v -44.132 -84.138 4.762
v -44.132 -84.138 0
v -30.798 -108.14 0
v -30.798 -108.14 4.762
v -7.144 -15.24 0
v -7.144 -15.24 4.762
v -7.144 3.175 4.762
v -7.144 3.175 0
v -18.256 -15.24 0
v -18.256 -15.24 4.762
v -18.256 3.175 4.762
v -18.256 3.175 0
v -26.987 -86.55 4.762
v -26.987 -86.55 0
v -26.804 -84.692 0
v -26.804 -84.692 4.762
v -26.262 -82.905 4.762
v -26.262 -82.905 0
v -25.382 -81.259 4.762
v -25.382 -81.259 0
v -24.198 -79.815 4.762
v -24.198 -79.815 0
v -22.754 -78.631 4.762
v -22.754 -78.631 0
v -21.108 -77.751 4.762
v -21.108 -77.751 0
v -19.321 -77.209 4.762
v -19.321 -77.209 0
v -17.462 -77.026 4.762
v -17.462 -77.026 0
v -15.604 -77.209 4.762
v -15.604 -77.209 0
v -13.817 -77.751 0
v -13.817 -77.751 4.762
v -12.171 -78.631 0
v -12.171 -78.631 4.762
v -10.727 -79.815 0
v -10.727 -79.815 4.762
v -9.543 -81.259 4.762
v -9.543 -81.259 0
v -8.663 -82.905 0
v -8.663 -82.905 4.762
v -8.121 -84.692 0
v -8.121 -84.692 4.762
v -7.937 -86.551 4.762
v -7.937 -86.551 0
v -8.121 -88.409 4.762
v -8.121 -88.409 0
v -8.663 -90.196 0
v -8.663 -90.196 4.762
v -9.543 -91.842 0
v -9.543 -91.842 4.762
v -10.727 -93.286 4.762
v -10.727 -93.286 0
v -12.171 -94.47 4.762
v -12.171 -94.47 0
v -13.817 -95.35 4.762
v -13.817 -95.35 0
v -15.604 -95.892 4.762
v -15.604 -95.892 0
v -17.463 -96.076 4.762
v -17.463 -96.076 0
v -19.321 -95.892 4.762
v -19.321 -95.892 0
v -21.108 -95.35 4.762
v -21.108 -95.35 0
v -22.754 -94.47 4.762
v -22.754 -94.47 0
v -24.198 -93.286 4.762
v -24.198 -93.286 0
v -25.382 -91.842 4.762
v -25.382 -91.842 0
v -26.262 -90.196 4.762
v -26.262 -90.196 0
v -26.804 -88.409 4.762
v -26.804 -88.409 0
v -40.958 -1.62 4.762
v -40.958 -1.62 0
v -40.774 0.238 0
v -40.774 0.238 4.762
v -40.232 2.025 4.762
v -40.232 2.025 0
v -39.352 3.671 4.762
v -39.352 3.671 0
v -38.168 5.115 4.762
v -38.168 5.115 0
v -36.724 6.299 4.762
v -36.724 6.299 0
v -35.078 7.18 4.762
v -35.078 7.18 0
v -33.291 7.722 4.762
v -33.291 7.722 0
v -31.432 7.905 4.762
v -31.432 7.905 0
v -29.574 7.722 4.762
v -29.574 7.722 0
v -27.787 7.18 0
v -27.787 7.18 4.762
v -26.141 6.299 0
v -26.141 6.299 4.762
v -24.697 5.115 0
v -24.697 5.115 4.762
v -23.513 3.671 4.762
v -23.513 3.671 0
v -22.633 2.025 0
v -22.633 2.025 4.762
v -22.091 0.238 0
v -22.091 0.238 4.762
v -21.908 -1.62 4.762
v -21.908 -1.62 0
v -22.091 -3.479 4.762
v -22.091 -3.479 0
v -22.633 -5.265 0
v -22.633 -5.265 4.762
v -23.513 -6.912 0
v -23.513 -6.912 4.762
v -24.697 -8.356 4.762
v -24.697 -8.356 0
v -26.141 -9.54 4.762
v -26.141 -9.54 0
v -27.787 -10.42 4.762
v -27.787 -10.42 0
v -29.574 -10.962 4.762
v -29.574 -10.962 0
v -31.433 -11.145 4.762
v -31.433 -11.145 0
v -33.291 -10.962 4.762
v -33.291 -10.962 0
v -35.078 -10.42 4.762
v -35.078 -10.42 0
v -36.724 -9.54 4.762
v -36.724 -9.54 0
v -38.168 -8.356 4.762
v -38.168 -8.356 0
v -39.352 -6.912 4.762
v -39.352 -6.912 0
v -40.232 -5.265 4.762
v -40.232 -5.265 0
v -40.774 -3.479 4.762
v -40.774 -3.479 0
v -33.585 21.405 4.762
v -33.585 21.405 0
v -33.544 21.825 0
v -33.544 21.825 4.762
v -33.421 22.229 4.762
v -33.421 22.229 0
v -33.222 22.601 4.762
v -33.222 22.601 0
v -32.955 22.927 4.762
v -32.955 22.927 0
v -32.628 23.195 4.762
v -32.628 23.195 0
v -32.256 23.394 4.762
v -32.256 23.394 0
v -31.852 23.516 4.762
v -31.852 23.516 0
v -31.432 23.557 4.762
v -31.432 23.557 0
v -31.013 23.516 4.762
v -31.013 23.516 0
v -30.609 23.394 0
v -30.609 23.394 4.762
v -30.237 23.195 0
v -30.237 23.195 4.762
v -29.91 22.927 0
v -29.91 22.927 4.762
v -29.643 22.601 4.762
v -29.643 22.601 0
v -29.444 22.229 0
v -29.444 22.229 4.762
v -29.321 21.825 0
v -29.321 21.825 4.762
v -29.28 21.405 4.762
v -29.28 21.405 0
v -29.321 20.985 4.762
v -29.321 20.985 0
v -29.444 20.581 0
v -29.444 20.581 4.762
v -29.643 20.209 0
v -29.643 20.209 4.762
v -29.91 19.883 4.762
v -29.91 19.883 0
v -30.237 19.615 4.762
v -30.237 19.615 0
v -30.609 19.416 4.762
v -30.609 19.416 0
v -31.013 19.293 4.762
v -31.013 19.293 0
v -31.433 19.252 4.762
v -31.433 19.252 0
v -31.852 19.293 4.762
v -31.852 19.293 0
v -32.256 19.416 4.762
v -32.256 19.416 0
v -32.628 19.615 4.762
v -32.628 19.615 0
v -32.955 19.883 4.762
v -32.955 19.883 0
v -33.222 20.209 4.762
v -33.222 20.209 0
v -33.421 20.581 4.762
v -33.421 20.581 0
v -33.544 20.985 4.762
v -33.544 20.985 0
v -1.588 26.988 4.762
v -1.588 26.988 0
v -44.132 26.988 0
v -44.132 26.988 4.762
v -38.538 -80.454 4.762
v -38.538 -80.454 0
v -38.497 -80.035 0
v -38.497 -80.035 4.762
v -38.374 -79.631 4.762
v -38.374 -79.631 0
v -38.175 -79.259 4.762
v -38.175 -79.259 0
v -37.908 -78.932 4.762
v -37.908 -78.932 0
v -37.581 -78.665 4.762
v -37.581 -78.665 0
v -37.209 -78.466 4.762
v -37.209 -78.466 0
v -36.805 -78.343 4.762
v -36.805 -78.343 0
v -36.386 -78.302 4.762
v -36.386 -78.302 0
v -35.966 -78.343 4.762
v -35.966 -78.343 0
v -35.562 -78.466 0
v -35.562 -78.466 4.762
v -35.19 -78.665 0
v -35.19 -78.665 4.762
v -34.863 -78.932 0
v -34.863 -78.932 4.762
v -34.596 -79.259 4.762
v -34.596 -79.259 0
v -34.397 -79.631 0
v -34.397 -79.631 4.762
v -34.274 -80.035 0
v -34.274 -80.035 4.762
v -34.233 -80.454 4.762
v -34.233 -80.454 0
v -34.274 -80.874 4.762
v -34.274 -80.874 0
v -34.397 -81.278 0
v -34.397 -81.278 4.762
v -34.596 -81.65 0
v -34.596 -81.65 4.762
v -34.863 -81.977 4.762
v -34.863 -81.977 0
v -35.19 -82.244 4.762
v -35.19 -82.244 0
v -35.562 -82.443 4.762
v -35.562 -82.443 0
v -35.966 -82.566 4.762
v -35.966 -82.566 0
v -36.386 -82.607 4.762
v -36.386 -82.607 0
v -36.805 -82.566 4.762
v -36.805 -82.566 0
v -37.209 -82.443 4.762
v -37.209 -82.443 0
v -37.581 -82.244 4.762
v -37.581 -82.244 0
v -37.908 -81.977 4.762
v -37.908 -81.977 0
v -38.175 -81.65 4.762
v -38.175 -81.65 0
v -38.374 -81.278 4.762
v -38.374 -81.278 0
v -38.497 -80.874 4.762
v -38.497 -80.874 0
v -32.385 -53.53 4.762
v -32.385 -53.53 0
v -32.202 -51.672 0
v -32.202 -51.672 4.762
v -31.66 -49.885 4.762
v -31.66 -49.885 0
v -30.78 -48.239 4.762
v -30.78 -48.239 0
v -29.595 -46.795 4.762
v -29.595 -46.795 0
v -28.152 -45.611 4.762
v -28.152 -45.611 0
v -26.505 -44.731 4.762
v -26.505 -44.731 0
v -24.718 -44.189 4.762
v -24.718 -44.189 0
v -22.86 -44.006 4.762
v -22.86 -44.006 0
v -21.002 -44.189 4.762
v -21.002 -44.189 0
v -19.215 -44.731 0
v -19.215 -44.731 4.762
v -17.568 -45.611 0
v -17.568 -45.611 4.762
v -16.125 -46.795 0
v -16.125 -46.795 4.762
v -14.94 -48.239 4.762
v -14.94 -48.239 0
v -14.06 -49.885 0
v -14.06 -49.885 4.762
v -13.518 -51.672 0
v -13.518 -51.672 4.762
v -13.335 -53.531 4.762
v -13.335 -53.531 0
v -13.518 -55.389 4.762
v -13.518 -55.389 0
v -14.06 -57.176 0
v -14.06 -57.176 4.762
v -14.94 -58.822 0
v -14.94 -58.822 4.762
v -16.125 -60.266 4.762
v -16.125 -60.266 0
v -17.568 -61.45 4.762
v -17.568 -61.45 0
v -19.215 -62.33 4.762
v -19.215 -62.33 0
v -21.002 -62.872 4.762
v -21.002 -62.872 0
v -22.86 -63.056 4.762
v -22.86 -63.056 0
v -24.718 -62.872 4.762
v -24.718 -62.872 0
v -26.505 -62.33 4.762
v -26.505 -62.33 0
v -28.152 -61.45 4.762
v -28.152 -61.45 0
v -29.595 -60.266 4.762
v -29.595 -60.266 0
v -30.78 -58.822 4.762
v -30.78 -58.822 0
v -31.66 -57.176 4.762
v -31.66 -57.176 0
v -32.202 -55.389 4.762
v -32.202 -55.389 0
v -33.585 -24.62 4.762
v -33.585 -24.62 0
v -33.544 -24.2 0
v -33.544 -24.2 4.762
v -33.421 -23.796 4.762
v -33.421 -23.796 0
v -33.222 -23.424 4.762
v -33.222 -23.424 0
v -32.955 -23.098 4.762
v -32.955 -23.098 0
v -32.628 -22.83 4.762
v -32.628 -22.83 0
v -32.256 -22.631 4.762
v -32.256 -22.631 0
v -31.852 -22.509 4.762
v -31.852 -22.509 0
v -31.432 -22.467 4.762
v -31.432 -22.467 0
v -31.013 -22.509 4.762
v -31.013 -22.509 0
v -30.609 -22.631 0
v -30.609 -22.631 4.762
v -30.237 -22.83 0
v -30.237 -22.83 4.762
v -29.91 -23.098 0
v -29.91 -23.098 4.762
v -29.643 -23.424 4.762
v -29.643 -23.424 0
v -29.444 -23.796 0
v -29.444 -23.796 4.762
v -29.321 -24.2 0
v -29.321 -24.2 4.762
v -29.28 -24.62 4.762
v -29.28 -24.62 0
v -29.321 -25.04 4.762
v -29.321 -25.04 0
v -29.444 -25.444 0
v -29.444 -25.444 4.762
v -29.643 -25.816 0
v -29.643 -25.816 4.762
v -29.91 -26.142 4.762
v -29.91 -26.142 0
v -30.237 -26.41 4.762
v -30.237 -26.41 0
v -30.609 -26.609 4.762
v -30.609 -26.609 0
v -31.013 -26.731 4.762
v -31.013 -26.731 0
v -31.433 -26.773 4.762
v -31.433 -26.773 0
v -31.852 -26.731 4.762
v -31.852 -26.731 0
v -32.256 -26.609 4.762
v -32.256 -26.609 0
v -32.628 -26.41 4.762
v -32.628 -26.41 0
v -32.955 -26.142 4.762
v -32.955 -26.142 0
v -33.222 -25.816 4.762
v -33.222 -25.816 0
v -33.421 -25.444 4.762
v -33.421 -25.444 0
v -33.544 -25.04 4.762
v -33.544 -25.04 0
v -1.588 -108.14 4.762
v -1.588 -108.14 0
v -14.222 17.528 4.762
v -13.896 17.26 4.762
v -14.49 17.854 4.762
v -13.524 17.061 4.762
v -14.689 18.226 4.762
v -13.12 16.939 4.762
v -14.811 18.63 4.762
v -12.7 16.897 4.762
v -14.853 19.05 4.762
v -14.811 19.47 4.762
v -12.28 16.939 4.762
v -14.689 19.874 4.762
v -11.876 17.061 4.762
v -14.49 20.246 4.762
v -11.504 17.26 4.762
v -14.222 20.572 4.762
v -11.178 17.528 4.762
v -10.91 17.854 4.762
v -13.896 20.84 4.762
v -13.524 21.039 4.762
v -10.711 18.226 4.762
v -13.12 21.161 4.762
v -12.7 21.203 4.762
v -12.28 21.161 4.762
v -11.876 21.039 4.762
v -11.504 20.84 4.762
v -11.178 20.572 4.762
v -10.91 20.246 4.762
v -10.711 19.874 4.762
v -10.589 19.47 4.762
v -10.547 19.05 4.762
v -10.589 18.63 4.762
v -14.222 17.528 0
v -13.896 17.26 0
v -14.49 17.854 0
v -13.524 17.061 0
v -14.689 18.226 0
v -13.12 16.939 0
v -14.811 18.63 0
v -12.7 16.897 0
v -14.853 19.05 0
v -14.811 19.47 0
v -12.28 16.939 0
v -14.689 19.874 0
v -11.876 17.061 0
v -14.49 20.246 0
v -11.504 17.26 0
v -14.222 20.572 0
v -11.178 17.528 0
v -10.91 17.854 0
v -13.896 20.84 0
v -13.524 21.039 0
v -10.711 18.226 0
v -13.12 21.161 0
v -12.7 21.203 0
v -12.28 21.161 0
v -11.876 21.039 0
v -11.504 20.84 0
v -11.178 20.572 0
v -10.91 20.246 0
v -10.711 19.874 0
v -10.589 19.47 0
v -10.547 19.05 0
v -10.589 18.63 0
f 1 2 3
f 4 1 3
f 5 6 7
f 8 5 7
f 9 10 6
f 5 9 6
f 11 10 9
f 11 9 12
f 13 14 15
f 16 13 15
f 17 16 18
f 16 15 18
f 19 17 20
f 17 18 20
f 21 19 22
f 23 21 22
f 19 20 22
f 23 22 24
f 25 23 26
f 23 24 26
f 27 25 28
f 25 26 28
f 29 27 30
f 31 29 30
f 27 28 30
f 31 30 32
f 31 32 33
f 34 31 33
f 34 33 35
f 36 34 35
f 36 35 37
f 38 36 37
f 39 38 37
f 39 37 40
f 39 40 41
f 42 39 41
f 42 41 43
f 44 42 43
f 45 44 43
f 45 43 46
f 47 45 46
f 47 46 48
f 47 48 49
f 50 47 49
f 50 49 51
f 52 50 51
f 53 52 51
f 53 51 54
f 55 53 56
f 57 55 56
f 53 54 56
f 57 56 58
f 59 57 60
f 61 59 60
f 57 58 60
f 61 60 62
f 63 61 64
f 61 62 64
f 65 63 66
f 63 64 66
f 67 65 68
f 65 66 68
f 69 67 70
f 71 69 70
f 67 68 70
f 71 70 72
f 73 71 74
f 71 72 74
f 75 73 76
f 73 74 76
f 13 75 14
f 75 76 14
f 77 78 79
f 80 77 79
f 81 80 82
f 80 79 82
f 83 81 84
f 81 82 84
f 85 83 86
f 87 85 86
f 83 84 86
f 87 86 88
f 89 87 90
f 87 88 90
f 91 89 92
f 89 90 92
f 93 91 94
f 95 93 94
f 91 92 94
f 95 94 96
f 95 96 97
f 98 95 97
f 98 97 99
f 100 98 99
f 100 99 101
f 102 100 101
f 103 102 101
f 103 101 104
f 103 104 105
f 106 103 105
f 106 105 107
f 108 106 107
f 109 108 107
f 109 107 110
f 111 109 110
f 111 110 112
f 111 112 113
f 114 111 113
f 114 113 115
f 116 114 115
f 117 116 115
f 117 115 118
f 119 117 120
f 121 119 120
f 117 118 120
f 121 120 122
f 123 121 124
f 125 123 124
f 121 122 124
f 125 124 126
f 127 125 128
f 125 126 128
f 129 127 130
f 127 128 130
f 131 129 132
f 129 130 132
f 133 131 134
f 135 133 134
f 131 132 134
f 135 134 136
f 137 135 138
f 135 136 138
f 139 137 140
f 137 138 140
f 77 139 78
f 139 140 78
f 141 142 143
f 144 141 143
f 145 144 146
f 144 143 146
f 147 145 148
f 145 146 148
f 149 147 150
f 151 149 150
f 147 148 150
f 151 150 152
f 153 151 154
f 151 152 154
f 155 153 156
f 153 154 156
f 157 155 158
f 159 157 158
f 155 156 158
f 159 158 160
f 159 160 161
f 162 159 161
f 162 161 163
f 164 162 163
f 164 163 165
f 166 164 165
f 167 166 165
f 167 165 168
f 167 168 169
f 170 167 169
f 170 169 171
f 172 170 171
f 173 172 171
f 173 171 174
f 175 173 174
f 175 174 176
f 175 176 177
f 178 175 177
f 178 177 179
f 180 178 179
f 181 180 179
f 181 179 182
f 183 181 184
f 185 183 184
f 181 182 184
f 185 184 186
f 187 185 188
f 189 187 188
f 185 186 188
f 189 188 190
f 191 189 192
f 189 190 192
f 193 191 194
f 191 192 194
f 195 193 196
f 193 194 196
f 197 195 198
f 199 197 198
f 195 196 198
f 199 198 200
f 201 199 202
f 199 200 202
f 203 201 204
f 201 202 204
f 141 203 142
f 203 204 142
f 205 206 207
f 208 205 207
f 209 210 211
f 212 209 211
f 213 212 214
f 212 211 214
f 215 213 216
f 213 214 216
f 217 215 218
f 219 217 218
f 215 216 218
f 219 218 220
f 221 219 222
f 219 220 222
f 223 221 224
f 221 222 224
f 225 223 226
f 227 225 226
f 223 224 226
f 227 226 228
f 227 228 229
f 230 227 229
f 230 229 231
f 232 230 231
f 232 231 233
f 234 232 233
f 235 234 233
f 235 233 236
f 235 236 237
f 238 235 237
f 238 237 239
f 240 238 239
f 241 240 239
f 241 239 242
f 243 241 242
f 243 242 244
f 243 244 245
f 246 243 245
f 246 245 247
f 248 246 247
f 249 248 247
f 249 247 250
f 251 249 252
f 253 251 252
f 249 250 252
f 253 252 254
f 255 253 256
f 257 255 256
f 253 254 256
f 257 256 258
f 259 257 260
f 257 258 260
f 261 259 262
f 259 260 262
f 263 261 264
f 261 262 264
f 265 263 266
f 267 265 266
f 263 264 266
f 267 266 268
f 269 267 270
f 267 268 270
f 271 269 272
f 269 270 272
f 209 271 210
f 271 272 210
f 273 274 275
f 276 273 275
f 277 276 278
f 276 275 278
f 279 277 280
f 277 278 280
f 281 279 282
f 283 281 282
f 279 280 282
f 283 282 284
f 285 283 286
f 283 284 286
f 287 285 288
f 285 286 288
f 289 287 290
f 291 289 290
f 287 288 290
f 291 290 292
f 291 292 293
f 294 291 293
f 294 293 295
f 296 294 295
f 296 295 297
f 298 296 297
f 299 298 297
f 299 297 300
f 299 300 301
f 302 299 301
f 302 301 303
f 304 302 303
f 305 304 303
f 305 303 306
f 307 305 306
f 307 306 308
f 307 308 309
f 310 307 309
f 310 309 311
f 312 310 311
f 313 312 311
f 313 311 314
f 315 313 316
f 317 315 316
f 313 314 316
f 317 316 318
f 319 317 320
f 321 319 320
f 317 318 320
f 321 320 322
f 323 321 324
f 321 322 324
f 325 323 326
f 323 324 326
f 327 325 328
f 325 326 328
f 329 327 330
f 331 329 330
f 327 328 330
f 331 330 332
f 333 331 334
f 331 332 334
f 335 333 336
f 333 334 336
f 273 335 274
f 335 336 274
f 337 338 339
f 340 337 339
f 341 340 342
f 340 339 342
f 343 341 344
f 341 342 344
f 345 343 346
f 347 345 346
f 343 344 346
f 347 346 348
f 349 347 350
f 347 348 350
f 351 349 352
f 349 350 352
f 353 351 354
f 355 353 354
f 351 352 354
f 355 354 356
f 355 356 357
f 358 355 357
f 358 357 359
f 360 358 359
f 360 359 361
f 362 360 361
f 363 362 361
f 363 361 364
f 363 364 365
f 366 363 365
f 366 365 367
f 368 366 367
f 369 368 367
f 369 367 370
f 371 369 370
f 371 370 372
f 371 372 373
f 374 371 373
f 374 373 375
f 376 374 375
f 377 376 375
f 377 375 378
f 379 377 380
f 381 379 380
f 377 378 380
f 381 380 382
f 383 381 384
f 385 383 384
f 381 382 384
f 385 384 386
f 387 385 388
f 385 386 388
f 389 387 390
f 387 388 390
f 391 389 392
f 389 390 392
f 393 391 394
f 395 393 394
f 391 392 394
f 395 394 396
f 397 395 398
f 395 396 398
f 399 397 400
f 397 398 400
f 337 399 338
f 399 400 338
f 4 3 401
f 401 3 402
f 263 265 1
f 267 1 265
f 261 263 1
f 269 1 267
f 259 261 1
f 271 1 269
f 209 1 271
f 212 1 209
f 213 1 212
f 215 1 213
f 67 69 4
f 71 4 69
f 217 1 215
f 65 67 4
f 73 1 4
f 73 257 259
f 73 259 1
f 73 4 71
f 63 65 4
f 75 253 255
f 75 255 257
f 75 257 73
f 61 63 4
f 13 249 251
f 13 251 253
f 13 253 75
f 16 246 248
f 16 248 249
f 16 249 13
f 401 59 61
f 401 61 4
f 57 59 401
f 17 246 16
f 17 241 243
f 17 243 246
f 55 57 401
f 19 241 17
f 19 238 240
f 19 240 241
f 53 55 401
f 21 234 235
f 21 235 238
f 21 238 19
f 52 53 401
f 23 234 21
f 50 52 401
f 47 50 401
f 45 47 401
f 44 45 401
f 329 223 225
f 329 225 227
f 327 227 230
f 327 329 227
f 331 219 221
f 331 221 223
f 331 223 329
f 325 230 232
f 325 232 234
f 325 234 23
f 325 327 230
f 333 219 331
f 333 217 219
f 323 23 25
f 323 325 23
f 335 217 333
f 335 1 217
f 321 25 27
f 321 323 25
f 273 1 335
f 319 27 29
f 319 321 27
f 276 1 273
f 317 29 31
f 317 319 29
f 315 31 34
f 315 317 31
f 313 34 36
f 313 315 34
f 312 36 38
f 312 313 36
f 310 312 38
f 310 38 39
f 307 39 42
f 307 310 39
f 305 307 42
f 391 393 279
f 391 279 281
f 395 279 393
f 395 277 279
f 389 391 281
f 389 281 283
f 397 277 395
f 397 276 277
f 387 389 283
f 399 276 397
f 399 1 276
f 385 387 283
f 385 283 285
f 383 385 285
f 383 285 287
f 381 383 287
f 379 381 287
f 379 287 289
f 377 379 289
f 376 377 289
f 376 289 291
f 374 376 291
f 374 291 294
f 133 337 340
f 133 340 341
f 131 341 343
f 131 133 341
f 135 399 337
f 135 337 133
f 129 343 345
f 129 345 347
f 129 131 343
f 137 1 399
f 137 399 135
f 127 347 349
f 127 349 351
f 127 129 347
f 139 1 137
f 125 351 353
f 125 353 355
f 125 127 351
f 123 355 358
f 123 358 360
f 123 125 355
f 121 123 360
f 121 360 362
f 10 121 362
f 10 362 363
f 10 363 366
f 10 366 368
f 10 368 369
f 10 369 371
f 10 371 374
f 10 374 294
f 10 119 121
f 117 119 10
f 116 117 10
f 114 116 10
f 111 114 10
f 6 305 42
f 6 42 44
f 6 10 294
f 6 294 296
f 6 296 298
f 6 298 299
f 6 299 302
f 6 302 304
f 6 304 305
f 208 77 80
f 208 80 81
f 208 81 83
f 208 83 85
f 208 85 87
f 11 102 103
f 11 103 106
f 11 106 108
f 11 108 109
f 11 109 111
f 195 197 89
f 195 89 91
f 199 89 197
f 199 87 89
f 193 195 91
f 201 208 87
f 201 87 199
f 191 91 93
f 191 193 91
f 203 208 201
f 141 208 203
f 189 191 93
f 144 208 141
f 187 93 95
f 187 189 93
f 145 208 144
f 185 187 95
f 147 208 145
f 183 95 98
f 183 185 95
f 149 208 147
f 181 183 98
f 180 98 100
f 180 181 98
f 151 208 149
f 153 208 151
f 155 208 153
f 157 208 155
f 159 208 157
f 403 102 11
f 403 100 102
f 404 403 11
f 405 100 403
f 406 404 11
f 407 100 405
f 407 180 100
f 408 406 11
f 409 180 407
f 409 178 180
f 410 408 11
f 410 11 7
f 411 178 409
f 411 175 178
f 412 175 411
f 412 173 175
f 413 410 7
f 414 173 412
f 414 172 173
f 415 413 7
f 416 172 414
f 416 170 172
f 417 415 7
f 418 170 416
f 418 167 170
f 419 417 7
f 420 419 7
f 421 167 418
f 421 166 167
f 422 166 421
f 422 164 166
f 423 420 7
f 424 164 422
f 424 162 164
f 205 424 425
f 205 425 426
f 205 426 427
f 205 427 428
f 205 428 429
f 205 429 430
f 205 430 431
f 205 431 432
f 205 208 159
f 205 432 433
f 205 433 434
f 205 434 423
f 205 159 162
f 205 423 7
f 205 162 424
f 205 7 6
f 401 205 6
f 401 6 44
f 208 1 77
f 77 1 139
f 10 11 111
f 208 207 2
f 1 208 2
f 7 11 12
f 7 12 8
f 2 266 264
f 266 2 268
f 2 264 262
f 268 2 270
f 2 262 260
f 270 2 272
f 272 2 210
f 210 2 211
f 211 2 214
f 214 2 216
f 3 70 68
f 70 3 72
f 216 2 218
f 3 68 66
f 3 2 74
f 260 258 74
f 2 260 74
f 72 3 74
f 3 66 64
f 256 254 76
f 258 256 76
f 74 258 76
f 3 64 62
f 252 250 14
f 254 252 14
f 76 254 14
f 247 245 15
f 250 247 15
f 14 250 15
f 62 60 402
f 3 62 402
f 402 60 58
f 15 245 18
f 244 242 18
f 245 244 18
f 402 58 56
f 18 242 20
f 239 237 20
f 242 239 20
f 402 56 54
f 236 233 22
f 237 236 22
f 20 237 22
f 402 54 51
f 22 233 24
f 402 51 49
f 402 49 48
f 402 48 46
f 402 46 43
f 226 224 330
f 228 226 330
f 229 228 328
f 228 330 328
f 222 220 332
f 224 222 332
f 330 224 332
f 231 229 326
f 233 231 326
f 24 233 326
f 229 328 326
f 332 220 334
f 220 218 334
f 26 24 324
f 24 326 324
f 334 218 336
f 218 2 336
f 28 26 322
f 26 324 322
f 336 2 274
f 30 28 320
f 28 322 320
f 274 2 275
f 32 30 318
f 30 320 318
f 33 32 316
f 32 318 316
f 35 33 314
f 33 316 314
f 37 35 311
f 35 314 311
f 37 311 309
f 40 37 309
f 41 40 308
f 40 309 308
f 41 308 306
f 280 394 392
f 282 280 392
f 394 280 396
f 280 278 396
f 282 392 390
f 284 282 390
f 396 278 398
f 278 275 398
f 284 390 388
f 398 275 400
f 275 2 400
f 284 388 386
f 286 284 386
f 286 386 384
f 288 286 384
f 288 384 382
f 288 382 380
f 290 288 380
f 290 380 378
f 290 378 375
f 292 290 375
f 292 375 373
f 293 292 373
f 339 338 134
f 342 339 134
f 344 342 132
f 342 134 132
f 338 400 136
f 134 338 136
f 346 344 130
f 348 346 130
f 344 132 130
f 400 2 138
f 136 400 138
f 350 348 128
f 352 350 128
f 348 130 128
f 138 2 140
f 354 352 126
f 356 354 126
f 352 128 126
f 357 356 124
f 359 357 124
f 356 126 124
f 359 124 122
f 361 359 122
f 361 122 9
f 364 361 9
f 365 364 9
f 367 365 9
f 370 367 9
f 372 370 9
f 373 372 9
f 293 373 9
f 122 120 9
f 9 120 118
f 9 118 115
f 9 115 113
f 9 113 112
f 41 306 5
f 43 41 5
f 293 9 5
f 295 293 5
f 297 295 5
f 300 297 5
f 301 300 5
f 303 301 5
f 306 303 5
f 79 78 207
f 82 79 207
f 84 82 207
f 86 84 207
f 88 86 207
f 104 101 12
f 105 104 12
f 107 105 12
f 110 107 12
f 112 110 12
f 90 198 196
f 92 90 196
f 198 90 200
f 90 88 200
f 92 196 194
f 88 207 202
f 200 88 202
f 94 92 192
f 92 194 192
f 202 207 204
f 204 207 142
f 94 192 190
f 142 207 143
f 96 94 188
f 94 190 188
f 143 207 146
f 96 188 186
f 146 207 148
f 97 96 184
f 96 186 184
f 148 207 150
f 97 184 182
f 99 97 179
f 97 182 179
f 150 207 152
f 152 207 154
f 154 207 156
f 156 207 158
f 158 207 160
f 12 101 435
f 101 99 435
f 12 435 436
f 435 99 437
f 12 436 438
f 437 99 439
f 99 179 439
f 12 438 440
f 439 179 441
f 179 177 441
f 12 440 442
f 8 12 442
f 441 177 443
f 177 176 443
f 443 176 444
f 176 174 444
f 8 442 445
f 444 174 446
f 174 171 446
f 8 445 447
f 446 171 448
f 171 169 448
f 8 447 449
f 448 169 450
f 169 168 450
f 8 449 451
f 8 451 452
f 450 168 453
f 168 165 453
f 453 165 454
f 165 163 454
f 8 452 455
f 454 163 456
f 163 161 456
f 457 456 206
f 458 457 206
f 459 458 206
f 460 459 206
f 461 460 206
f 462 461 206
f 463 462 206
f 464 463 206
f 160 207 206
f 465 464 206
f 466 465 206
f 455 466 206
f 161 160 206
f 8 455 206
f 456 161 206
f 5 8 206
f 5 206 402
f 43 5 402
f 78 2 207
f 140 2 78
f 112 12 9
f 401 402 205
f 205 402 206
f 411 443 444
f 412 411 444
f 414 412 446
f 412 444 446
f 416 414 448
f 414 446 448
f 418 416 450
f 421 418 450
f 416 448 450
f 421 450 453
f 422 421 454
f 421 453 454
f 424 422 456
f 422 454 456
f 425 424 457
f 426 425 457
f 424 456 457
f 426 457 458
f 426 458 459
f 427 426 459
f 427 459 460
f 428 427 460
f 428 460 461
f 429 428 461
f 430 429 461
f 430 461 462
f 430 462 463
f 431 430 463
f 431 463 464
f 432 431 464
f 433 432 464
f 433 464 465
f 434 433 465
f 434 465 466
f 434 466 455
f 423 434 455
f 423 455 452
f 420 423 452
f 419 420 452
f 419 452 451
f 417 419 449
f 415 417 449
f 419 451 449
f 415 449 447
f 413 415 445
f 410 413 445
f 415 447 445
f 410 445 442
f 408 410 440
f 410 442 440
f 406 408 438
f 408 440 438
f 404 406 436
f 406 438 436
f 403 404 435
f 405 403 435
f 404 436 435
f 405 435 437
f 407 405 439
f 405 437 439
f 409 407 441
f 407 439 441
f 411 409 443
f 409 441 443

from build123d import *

# Parameters (mm, degrees)
BOSS_EXTRUDE1_DEPTH         = 4.7625
F_3_4_0_75_DIAMETER_HOLE1_D = 19.05
SKETCH4_W                   = 11.1125
SKETCH4_H                   = 18.415
CUT_EXTRUDE1_DEPTH          = 5.7625
F_6_CLEARANCE_HOLE1_D       = 4.3053


with BuildPart() as part:
    # Sketch1 → Boss-Extrude1 (new body)
    with BuildSketch(Plane.XY):
        Polygon((-44.1325, -84.1375), (-30.7975, -108.1405), (-1.5875, -108.1405), (-1.5875, 26.9875), (-44.1325, 26.9875), align=None)
    extrude(amount=BOSS_EXTRUDE1_DEPTH)

    # 3/4 (0.75) Diameter Hole1 (through all)
    with Locations(Plane.XY.offset(4.7625)):
        with Locations((-31.4325, -1.620345612), (-17.4625, -86.5505), (-22.86, -53.5305)):
            Hole(F_3_4_0_75_DIAMETER_HOLE1_D / 2)

    # Sketch4 → Cut-Extrude1 (cut, through all)
    with BuildSketch(Plane.XY.offset(4.7625)):
        with Locations((-12.7, -6.0325)):
            Rectangle(SKETCH4_W, SKETCH4_H)
    extrude(amount=-CUT_EXTRUDE1_DEPTH, mode=Mode.SUBTRACT)

    # #6 Clearance Hole1 (through all)
    with Locations(Plane.XY.offset(4.7625)):
        with Locations((-36.3855, -80.4545), (-12.7, 19.05), (-31.4325, 21.404754388), (-31.4325, -24.620045612)):
            Hole(F_6_CLEARANCE_HOLE1_D / 2)


solid = part.part
